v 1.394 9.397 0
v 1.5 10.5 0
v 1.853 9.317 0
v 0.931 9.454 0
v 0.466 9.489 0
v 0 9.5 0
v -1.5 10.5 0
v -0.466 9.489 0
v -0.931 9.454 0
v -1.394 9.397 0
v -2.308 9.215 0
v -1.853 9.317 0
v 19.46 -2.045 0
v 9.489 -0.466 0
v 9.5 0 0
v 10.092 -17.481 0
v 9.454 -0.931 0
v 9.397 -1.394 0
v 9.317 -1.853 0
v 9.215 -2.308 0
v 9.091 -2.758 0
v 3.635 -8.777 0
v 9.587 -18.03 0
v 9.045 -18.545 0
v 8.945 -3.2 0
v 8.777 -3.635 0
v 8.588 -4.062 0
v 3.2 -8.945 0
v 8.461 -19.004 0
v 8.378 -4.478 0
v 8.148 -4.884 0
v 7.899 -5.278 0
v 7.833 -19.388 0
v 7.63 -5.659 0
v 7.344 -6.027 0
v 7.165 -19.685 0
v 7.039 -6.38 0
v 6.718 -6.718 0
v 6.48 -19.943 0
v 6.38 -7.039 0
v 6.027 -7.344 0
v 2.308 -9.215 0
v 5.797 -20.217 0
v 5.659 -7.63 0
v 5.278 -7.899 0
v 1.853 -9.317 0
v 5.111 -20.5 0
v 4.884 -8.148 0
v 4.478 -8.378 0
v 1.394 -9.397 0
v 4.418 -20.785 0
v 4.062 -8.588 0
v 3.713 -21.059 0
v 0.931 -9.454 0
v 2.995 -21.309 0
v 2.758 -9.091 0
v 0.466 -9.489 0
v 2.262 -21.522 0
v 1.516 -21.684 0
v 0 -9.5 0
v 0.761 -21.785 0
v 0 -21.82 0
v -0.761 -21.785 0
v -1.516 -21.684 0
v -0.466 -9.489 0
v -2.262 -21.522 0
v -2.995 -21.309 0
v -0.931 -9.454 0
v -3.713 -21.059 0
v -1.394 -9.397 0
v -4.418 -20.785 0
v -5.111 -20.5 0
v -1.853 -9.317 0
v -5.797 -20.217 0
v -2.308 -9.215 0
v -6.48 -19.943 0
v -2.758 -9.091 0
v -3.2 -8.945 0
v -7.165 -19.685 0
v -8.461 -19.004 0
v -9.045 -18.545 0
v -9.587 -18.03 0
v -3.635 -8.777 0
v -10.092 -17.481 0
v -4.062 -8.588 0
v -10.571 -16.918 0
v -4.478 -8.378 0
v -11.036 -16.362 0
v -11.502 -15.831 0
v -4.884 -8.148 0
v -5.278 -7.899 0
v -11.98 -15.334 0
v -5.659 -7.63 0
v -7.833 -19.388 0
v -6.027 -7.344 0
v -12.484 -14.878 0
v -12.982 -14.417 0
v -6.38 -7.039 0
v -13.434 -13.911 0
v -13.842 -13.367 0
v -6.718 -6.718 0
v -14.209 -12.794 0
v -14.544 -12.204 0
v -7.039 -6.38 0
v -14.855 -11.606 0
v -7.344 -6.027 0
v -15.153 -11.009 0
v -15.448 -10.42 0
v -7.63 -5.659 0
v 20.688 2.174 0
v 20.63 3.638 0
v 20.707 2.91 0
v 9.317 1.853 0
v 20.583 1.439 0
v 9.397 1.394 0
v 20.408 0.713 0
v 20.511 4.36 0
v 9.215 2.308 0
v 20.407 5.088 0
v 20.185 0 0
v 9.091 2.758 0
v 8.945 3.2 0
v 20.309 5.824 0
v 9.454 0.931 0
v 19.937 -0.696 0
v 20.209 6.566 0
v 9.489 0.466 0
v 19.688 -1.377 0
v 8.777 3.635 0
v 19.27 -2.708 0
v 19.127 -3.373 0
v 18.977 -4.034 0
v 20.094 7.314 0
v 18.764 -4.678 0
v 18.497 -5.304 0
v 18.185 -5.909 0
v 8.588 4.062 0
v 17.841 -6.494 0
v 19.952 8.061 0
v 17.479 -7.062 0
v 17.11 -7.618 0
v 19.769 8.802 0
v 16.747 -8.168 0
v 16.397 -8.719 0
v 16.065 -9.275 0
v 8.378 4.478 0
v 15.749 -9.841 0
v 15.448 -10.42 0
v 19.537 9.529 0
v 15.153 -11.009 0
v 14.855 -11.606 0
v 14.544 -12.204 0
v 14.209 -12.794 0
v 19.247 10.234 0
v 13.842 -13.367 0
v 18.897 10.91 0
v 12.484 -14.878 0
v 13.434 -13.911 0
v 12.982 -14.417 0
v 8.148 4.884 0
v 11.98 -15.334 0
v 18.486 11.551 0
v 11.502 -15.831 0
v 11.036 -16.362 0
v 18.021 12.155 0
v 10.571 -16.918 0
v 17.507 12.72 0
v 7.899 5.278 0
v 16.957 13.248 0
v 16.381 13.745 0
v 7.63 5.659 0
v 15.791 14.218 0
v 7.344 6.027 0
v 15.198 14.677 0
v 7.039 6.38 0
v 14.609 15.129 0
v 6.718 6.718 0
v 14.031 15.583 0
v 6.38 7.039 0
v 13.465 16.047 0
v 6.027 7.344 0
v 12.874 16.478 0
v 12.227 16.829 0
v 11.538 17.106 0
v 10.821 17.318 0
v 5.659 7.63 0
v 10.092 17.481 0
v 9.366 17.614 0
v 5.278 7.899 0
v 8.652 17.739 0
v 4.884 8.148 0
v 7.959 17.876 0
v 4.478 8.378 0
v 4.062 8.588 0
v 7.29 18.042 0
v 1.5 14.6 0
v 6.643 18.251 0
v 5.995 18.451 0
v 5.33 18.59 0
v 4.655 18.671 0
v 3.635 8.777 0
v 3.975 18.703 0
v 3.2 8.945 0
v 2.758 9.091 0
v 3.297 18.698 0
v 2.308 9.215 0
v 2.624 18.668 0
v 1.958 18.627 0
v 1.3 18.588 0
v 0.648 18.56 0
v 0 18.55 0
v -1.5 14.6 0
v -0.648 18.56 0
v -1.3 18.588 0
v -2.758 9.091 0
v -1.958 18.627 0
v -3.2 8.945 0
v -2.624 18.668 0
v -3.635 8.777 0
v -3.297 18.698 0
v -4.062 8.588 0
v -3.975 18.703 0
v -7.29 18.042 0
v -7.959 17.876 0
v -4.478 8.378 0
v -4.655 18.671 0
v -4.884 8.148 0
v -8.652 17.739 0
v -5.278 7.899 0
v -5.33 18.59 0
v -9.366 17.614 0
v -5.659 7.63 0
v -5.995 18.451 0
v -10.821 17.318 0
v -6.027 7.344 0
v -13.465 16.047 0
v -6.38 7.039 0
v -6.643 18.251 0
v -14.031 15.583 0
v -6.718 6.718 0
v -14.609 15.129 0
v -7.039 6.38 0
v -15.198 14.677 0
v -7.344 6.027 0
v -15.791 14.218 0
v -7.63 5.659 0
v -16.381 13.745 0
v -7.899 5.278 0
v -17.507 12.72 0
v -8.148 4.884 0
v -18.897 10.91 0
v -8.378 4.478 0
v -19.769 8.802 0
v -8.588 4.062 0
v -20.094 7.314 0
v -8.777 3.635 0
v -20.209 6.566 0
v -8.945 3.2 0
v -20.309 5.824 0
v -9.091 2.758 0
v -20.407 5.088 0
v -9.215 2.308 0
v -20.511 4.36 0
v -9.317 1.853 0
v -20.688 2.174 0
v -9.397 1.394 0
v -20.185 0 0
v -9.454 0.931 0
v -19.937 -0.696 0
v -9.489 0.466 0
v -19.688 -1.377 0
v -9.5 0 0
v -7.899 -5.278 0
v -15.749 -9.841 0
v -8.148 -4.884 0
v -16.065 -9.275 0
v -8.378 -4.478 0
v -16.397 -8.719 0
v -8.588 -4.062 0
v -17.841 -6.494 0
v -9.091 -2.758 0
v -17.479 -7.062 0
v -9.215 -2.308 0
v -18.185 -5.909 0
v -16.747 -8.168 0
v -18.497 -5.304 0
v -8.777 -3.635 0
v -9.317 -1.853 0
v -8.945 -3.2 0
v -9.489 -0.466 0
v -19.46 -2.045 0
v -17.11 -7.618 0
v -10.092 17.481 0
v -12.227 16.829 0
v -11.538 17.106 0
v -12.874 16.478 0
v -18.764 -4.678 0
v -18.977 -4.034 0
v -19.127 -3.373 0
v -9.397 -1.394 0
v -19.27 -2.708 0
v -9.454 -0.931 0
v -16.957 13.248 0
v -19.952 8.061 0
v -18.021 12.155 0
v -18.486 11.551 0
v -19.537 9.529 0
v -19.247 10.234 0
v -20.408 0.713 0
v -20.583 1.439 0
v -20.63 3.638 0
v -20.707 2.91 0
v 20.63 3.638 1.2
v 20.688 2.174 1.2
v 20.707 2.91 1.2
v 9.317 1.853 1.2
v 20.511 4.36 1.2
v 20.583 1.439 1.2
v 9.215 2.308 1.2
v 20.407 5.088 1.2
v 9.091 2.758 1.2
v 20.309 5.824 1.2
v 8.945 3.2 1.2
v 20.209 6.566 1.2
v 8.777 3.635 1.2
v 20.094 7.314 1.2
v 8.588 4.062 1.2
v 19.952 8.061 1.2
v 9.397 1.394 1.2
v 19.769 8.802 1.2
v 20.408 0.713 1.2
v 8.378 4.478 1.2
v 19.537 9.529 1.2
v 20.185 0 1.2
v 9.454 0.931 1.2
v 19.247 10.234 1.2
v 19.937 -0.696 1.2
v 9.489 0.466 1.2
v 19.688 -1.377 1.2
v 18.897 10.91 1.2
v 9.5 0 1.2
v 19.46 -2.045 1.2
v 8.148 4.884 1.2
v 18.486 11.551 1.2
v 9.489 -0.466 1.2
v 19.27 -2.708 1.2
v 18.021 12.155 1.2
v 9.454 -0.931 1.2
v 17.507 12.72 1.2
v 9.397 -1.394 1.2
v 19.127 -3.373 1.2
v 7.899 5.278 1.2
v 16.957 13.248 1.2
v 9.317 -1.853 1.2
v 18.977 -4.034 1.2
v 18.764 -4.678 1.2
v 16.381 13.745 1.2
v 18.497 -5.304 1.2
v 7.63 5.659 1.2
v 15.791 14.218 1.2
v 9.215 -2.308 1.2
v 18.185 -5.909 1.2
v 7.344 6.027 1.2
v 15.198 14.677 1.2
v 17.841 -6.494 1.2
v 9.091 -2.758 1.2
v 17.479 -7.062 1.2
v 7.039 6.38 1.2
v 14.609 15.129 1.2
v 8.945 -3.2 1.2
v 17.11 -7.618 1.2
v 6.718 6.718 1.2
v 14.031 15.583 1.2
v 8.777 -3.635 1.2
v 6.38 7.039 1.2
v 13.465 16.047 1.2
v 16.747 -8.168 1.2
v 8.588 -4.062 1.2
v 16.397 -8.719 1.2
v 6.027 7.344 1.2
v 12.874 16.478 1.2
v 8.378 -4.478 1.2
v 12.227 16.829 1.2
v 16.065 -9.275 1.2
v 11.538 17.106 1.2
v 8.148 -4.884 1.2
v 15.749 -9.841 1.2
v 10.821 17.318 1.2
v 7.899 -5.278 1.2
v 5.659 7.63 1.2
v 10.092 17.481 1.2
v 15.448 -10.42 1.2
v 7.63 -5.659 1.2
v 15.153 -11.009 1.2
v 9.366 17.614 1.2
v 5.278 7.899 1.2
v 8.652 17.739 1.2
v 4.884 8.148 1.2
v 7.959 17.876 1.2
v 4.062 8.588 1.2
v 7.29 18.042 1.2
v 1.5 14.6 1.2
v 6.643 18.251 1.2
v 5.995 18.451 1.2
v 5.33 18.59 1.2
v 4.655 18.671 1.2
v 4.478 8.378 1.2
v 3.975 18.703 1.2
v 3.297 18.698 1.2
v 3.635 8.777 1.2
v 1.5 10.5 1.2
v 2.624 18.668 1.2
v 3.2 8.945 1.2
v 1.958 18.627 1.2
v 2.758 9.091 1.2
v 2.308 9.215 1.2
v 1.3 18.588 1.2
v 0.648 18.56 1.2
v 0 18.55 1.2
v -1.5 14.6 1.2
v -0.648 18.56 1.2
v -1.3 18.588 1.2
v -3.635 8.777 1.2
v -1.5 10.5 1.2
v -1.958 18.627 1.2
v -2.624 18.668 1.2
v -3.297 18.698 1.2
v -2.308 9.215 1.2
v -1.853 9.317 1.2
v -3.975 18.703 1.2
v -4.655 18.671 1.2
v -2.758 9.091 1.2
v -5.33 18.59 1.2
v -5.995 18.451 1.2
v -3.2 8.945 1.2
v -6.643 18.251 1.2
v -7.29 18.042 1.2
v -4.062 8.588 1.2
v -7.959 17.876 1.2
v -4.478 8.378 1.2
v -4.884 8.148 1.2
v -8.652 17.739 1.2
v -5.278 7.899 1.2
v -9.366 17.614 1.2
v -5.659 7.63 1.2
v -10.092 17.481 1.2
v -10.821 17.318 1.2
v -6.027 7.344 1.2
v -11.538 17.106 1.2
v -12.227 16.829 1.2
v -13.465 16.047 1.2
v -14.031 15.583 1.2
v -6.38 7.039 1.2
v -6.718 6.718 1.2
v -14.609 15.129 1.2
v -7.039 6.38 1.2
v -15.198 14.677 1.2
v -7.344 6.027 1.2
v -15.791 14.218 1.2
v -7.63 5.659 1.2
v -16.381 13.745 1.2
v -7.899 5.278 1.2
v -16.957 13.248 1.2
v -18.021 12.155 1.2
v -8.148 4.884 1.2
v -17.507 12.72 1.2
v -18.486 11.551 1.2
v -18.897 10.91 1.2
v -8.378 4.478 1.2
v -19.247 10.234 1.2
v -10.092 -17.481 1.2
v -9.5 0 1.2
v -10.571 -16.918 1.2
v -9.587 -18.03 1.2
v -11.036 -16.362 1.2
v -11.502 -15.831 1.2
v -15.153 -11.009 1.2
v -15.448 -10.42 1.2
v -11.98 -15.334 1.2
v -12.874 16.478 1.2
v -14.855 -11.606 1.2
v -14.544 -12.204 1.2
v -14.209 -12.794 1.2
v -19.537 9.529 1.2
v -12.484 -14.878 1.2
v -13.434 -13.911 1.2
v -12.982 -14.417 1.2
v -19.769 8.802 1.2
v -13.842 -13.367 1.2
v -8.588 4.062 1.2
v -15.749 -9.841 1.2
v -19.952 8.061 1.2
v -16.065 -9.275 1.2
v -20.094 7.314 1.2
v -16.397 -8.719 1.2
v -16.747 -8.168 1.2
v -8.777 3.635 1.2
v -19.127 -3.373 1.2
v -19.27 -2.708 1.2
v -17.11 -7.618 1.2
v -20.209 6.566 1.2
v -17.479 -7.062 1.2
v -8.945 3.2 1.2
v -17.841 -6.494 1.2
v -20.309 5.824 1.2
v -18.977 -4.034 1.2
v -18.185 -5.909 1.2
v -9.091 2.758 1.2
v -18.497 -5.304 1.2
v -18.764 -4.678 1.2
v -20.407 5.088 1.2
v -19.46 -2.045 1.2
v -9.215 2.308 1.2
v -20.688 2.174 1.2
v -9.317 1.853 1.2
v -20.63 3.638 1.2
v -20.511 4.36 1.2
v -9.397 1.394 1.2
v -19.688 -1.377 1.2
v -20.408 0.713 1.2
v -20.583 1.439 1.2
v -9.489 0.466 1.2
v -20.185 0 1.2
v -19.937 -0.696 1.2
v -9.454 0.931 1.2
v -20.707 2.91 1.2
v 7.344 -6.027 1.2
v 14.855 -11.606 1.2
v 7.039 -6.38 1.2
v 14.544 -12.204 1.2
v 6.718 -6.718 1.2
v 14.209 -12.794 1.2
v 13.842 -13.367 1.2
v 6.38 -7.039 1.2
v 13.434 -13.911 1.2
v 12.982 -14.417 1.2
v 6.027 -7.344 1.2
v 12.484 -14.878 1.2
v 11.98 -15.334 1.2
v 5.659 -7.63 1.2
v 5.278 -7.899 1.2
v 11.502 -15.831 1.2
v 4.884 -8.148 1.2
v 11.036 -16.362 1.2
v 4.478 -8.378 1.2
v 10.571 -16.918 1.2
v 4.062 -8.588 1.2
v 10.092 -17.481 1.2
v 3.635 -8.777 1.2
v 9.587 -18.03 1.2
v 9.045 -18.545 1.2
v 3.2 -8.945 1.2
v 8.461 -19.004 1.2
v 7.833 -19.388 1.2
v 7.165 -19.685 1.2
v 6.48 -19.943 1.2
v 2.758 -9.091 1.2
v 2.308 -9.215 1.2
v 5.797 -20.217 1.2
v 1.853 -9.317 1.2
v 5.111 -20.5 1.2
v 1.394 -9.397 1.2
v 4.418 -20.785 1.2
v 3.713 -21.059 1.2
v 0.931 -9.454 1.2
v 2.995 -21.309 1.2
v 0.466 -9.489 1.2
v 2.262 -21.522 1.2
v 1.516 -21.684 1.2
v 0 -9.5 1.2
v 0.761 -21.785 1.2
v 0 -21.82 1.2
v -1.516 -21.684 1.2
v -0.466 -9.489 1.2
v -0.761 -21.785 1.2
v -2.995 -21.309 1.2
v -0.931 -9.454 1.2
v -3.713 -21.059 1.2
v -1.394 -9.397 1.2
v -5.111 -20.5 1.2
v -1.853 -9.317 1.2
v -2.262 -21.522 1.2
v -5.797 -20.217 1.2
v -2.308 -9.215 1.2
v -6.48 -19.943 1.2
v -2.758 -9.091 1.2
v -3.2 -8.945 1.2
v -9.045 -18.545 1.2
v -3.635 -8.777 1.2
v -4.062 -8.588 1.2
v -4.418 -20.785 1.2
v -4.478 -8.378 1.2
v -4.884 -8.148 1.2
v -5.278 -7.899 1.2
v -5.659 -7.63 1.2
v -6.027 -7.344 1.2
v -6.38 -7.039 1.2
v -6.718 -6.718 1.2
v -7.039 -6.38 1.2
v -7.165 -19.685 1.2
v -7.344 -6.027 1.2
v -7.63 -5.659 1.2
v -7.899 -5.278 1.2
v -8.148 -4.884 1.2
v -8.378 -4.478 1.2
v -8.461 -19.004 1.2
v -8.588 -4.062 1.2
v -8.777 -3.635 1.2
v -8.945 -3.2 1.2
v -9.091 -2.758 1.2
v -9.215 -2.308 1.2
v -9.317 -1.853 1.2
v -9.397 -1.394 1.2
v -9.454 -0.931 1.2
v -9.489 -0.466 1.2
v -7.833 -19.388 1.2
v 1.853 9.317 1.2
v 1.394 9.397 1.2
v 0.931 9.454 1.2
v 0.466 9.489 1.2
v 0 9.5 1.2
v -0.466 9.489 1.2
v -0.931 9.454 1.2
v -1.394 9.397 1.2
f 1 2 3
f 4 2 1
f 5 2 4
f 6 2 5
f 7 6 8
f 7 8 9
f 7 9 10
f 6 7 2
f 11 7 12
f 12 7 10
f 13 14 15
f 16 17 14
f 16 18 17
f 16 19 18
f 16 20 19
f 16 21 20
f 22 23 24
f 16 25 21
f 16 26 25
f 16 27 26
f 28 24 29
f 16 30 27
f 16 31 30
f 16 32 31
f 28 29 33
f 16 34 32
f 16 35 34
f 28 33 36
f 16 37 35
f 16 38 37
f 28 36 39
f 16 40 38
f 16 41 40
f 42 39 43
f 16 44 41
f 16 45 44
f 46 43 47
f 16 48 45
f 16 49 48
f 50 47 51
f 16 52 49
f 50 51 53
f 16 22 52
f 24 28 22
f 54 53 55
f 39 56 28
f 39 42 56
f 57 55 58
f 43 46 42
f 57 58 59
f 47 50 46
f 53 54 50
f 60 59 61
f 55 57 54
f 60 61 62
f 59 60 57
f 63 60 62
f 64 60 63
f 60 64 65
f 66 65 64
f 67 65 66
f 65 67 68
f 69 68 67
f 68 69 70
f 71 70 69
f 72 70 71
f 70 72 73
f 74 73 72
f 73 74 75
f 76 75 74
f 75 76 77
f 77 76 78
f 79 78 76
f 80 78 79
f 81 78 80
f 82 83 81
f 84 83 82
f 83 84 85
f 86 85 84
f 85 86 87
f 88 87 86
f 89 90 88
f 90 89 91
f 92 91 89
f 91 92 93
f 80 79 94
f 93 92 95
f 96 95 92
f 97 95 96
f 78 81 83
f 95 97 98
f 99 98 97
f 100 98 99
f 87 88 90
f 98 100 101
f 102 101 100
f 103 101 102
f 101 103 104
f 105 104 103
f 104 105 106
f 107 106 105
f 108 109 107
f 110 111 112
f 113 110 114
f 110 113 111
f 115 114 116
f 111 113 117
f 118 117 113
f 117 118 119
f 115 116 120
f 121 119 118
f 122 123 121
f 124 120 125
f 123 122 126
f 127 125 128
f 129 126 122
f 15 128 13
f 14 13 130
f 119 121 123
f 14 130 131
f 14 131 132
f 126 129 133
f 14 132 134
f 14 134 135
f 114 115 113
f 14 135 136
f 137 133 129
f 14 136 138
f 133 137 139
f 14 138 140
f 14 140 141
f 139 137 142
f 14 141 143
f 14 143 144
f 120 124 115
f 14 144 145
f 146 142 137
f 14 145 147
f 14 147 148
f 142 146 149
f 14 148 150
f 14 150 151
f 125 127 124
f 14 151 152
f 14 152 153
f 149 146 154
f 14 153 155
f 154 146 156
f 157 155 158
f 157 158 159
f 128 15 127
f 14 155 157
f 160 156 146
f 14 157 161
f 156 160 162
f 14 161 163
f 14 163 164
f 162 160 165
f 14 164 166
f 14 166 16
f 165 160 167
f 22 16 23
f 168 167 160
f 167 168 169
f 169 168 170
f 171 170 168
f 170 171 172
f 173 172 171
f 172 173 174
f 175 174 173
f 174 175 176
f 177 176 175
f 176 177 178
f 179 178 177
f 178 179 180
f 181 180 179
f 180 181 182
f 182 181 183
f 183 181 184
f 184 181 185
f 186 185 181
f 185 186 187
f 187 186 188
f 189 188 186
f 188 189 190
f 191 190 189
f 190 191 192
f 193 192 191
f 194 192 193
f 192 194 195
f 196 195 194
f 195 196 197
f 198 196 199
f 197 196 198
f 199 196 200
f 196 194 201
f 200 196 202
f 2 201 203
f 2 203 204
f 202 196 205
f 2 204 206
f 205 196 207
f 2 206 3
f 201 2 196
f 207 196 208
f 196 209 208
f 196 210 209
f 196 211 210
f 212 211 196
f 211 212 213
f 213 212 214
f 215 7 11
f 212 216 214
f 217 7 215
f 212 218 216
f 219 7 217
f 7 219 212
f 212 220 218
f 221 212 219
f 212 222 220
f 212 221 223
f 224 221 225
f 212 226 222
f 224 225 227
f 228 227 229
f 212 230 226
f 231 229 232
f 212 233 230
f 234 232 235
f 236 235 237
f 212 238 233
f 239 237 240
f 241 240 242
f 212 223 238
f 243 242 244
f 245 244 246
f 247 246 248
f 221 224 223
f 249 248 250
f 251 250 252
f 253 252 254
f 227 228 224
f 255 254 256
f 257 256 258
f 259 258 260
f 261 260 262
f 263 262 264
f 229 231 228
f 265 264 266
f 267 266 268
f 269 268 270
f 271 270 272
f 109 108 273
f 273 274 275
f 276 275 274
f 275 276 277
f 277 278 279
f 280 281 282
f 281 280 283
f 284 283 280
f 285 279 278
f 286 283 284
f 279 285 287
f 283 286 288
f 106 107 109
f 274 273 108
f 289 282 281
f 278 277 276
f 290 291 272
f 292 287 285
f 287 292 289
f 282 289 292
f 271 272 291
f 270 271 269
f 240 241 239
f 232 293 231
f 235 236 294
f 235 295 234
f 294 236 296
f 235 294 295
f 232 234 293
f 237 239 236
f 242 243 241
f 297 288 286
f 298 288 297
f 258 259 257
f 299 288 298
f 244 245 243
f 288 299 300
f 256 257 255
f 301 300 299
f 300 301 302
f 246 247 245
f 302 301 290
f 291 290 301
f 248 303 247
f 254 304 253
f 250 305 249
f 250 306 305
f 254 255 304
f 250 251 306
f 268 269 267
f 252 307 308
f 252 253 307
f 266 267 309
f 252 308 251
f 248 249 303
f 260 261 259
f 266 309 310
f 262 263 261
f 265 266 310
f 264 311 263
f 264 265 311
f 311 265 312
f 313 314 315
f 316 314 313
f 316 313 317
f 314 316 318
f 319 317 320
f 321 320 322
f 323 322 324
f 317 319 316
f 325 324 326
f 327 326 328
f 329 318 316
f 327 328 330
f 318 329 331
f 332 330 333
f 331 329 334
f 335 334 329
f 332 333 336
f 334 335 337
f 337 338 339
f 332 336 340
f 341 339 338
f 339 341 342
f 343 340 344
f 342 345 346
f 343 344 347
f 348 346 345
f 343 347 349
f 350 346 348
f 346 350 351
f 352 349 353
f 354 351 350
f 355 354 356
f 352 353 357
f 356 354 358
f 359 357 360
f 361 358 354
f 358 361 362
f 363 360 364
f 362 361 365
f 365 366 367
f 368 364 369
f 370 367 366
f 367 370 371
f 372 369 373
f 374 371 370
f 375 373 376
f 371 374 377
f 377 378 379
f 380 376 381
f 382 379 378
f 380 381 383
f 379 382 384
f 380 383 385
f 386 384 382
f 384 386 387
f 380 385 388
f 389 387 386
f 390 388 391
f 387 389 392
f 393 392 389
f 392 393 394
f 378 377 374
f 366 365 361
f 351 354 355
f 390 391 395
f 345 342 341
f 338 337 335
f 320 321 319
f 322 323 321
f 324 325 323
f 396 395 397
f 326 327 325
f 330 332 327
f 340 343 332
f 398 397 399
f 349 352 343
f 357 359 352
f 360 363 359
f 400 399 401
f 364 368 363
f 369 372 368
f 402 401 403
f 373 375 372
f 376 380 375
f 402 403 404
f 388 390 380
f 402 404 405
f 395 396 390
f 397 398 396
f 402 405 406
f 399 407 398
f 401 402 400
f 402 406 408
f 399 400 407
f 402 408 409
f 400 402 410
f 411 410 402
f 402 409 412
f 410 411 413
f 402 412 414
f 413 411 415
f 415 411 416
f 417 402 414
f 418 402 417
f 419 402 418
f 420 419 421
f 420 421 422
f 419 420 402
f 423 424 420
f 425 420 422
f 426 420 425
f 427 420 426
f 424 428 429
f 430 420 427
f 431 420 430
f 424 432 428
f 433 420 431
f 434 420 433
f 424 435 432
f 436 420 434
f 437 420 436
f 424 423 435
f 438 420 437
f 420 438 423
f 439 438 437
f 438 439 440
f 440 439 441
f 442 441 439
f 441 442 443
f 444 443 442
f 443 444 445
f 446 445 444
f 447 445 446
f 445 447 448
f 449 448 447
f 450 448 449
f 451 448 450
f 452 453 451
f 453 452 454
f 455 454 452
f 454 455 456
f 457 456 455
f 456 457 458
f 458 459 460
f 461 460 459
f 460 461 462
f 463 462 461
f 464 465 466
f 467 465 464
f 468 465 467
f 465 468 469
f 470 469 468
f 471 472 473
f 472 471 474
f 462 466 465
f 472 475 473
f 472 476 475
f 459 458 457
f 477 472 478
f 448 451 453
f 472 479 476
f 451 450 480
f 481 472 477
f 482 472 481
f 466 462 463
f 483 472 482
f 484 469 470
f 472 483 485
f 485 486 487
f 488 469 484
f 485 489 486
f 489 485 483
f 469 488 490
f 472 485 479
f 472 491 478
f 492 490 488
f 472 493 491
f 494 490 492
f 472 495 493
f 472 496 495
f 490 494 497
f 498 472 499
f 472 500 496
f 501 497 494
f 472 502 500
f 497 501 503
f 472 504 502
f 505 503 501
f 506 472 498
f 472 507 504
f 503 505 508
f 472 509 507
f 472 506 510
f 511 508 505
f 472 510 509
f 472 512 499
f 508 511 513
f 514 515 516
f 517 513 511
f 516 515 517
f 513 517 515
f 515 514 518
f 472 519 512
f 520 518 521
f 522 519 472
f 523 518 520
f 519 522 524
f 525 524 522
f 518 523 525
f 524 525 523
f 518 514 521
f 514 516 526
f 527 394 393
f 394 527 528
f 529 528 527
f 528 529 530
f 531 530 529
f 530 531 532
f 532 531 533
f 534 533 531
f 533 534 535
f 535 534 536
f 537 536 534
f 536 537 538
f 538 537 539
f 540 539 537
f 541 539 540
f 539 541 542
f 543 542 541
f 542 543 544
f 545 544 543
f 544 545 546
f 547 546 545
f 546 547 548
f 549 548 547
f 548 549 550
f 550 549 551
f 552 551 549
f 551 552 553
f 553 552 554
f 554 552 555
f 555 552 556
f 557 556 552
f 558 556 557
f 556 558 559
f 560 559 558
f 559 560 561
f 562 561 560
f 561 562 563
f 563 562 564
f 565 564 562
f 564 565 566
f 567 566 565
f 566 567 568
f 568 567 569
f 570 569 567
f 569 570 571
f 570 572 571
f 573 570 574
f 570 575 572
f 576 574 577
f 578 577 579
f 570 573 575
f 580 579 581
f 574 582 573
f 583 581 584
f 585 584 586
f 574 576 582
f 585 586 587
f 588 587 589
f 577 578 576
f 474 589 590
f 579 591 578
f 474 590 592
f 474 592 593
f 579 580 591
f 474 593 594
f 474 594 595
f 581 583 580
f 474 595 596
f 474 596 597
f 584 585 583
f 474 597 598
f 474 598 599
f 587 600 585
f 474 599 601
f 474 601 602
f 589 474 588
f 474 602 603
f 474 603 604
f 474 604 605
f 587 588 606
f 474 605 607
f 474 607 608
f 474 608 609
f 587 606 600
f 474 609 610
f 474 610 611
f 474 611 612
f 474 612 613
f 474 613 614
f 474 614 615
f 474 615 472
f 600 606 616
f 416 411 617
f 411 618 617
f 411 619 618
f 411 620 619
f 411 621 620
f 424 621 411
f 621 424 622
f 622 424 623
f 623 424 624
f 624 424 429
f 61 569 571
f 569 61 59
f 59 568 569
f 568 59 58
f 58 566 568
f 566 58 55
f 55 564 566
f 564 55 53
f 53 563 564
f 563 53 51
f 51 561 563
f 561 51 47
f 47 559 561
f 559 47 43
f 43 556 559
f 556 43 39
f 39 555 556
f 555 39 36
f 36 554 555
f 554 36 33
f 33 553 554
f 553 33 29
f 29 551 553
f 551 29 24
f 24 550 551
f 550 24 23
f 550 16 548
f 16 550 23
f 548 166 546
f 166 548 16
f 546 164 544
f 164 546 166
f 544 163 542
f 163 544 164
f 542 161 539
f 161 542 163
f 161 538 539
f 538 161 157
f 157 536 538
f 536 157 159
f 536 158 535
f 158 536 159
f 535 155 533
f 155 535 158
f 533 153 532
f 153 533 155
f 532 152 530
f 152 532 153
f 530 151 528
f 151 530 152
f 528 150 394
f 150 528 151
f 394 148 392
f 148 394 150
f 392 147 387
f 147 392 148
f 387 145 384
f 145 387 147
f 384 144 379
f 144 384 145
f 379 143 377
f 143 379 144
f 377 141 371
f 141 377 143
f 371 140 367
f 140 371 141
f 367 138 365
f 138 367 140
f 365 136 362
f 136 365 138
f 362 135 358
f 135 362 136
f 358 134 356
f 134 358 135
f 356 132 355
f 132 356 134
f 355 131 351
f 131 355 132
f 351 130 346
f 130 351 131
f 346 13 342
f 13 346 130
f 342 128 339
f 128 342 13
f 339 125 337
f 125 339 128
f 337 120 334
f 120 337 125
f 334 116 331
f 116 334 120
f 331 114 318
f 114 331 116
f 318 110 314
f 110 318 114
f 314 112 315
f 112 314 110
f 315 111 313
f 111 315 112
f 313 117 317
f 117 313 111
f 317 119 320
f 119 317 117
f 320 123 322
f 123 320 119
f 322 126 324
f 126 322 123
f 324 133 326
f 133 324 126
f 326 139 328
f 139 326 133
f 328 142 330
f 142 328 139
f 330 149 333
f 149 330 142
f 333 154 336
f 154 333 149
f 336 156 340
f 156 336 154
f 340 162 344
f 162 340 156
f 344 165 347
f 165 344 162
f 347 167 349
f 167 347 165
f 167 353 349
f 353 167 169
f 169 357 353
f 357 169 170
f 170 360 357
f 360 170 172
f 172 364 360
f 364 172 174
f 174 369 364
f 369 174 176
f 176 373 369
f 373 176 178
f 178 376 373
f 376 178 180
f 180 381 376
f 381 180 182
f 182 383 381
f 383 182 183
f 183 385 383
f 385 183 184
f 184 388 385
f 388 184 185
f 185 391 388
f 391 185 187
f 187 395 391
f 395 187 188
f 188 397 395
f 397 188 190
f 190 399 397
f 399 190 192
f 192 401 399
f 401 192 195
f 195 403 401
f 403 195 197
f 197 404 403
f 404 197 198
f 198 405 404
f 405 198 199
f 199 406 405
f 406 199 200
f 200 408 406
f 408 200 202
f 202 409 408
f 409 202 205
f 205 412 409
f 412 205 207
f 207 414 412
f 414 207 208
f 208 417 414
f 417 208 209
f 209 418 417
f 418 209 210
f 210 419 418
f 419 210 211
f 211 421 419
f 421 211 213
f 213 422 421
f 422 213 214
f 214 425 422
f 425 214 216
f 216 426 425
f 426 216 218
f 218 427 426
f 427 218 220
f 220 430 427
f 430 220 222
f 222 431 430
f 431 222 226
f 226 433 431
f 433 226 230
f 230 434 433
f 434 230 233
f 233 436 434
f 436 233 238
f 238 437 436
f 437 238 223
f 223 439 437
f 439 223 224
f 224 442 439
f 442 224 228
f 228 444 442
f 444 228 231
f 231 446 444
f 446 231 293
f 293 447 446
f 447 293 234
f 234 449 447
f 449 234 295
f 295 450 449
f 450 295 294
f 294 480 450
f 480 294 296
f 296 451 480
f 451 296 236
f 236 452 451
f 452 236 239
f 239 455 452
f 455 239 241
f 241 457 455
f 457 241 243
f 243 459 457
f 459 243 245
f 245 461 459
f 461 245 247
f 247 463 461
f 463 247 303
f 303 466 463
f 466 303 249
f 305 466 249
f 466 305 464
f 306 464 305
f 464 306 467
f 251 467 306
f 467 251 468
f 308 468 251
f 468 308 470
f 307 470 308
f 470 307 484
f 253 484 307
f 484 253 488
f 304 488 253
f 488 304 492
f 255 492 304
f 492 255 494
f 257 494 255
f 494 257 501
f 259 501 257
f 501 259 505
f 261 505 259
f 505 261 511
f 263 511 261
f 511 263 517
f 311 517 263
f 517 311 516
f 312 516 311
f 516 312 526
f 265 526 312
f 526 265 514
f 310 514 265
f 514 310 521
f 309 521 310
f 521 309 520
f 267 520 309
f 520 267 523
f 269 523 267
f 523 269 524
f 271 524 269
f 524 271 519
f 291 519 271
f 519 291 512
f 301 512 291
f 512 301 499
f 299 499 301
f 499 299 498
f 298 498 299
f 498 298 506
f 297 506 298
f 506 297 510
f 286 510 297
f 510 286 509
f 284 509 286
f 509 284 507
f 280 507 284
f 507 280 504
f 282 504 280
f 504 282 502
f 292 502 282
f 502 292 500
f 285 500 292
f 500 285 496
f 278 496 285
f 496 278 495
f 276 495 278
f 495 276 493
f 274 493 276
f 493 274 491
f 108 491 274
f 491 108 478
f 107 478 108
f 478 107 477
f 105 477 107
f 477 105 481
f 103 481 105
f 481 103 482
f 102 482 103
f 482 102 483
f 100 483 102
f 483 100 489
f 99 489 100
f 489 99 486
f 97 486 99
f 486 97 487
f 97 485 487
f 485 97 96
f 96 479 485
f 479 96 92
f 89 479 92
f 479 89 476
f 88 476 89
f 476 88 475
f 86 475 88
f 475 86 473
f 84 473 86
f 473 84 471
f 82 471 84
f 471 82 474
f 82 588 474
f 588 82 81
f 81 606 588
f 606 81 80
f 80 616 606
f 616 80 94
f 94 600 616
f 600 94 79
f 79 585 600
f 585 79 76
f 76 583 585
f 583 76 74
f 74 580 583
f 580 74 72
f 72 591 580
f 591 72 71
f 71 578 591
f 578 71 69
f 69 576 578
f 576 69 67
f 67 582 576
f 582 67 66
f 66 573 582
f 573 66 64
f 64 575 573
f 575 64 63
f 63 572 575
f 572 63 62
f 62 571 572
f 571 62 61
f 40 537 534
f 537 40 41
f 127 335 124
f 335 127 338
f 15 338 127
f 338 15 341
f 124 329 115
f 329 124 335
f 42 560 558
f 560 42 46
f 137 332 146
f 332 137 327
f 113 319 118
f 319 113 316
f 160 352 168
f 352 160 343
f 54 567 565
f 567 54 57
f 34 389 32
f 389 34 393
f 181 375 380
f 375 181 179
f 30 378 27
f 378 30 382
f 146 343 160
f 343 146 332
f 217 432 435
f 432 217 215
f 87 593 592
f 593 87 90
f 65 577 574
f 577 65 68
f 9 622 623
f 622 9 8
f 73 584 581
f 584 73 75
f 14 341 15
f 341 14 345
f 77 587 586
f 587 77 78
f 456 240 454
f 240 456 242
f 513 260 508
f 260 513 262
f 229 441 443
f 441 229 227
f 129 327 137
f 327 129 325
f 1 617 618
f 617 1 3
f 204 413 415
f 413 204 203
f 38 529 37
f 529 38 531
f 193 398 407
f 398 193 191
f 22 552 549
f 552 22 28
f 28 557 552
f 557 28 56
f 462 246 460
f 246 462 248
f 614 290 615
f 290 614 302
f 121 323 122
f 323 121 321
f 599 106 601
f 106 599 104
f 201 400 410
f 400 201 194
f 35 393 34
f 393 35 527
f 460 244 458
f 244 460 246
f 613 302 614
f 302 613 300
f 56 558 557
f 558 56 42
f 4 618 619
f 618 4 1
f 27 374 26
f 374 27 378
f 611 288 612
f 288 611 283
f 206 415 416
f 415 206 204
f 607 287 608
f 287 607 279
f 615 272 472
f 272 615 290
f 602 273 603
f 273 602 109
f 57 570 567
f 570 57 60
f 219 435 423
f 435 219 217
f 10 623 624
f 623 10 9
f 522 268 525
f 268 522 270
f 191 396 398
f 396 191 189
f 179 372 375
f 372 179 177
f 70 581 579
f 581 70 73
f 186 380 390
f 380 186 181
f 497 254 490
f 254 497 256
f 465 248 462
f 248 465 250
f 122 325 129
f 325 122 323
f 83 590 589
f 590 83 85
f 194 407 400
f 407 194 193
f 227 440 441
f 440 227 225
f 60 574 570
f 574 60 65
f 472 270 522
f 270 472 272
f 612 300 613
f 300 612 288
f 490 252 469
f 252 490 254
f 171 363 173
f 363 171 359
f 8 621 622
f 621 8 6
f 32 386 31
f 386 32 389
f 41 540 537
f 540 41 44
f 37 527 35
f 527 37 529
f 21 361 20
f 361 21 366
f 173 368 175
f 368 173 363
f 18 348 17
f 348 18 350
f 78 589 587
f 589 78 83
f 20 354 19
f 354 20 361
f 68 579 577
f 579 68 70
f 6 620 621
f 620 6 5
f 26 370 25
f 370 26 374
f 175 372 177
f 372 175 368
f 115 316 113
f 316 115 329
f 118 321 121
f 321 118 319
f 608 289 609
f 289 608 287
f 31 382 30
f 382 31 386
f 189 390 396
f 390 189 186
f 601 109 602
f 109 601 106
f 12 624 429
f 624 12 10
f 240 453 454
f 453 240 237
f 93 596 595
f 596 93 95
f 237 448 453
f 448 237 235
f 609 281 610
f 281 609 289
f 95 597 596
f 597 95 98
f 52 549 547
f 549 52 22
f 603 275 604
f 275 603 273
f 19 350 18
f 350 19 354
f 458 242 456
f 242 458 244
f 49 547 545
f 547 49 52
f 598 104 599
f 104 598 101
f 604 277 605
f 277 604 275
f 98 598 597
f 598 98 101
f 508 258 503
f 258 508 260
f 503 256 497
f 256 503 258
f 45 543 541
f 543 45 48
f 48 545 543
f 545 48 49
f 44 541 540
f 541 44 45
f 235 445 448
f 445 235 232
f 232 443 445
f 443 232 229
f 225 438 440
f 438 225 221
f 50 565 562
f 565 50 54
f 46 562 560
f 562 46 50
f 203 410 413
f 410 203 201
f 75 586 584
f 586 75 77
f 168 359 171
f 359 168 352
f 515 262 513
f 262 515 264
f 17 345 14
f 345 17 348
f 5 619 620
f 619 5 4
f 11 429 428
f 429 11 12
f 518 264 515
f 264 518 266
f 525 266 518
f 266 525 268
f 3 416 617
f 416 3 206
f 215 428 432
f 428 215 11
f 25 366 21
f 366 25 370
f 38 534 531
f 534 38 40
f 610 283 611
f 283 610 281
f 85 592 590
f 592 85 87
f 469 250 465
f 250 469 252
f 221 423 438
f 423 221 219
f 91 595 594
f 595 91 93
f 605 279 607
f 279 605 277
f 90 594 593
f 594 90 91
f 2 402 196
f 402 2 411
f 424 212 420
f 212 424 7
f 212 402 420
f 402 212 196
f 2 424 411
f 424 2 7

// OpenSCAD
/*
  Elna Supermatic cam 05
  Name: Scallop
  Status: candidate

  Generated from measured parametric base v2.
  Surface mode: smooth
*/

include <_elna_measured_common.scad>;

profile_points = [
        [0.0000, 18.5500],
        [0.6481, 18.5600],
        [1.2998, 18.5879],
        [1.9578, 18.6271],
        [2.6236, 18.6678],
        [3.2969, 18.6976],
        [3.9754, 18.7029],
        [4.6551, 18.6707],
        [5.3305, 18.5896],
        [5.9951, 18.4511],
        [6.6427, 18.2507],
        [7.2896, 18.0424],
        [7.9589, 17.8760],
        [8.6519, 17.7391],
        [9.3656, 17.6141],
        [10.0925, 17.4807],
        [10.8214, 17.3178],
        [11.5381, 17.1059],
        [12.2273, 16.8294],
        [12.8739, 16.4778],
        [13.4651, 16.0471],
        [14.0312, 15.5833],
        [14.6095, 15.1286],
        [15.1980, 14.6766],
        [15.7913, 14.2185],
        [16.3811, 13.7454],
        [16.9570, 13.2483],
        [17.5073, 12.7198],
        [18.0206, 12.1550],
        [18.4863, 11.5515],
        [18.8967, 10.9100],
        [19.2471, 10.2339],
        [19.5368, 9.5288],
        [19.7694, 8.8019],
        [19.9518, 8.0611],
        [20.0944, 7.3138],
        [20.2093, 6.5664],
        [20.3093, 5.8236],
        [20.4066, 5.0879],
        [20.5111, 4.3598],
        [20.6298, 3.6376],
        [20.7072, 2.9102],
        [20.6883, 2.1744],
        [20.5832, 1.4393],
        [20.4083, 0.7127],
        [20.1850, 0.0000],
        [19.9371, -0.6962],
        [19.6884, -1.3768],
        [19.4605, -2.0454],
        [19.2700, -2.7082],
        [19.1269, -3.3726],
        [18.9767, -4.0336],
        [18.7643, -4.6785],
        [18.4969, -5.3039],
        [18.1849, -5.9086],
        [17.8410, -6.4936],
        [17.4786, -7.0618],
        [17.1105, -7.6181],
        [16.7475, -8.1683],
        [16.3975, -8.7187],
        [16.0648, -9.2750],
        [15.7494, -9.8413],
        [15.4477, -10.4196],
        [15.1527, -11.0091],
        [14.8550, -11.6060],
        [14.5441, -12.2040],
        [14.2095, -12.7943],
        [13.8417, -13.3668],
        [13.4338, -13.9111],
        [12.9816, -14.4175],
        [12.4842, -14.8781],
        [11.9804, -15.3342],
        [11.5016, -15.8306],
        [11.0365, -16.3623],
        [10.5715, -16.9179],
        [10.0925, -17.4807],
        [9.5870, -18.0305],
        [9.0451, -18.5452],
        [8.4610, -19.0038],
        [7.8333, -19.3880],
        [7.1646, -19.6847],
        [6.4799, -19.9430],
        [5.7970, -20.2166],
        [5.1113, -20.5001],
        [4.4180, -20.7849],
        [3.7133, -21.0591],
        [2.9948, -21.3093],
        [2.2620, -21.5217],
        [1.5163, -21.6838],
        [0.7608, -21.7854],
        [0.0000, -21.8200],
        [-0.7608, -21.7854],
        [-1.5163, -21.6838],
        [-2.2620, -21.5217],
        [-2.9948, -21.3093],
        [-3.7133, -21.0591],
        [-4.4180, -20.7849],
        [-5.1113, -20.5001],
        [-5.7970, -20.2166],
        [-6.4799, -19.9430],
        [-7.1646, -19.6847],
        [-7.8333, -19.3880],
        [-8.4610, -19.0038],
        [-9.0451, -18.5452],
        [-9.5870, -18.0305],
        [-10.0925, -17.4807],
        [-10.5715, -16.9179],
        [-11.0365, -16.3623],
        [-11.5016, -15.8306],
        [-11.9804, -15.3342],
        [-12.4842, -14.8781],
        [-12.9816, -14.4175],
        [-13.4338, -13.9111],
        [-13.8417, -13.3668],
        [-14.2095, -12.7943],
        [-14.5441, -12.2040],
        [-14.8550, -11.6060],
        [-15.1527, -11.0091],
        [-15.4477, -10.4196],
        [-15.7494, -9.8413],
        [-16.0648, -9.2750],
        [-16.3975, -8.7187],
        [-16.7475, -8.1683],
        [-17.1105, -7.6181],
        [-17.4786, -7.0618],
        [-17.8410, -6.4936],
        [-18.1849, -5.9086],
        [-18.4969, -5.3039],
        [-18.7643, -4.6785],
        [-18.9767, -4.0336],
        [-19.1269, -3.3726],
        [-19.2700, -2.7082],
        [-19.4605, -2.0454],
        [-19.6884, -1.3768],
        [-19.9371, -0.6962],
        [-20.1850, -0.0000],
        [-20.4083, 0.7127],
        [-20.5832, 1.4393],
        [-20.6883, 2.1744],
        [-20.7072, 2.9102],
        [-20.6298, 3.6376],
        [-20.5111, 4.3598],
        [-20.4066, 5.0879],
        [-20.3093, 5.8236],
        [-20.2093, 6.5664],
        [-20.0944, 7.3138],
        [-19.9518, 8.0611],
        [-19.7694, 8.8019],
        [-19.5368, 9.5288],
        [-19.2471, 10.2339],
        [-18.8967, 10.9100],
        [-18.4863, 11.5515],
        [-18.0206, 12.1550],
        [-17.5073, 12.7198],
        [-16.9570, 13.2483],
        [-16.3811, 13.7454],
        [-15.7913, 14.2185],
        [-15.1980, 14.6766],
        [-14.6095, 15.1286],
        [-14.0312, 15.5833],
        [-13.4651, 16.0471],
        [-12.8739, 16.4778],
        [-12.2273, 16.8294],
        [-11.5381, 17.1059],
        [-10.8214, 17.3178],
        [-10.0925, 17.4807],
        [-9.3656, 17.6141],
        [-8.6519, 17.7391],
        [-7.9589, 17.8760],
        [-7.2896, 18.0424],
        [-6.6427, 18.2507],
        [-5.9951, 18.4511],
        [-5.3305, 18.5896],
        [-4.6551, 18.6707],
        [-3.9754, 18.7029],
        [-3.2969, 18.6976],
        [-2.6236, 18.6678],
        [-1.9578, 18.6271],
        [-1.2998, 18.5879],
        [-0.6481, 18.5600]
];

icon_points = [[-1.000,0.100], [-0.959,0.257], [-0.918,0.408], [-0.878,0.547], [-0.837,0.670], [-0.796,0.773], [-0.755,0.850], [-0.714,0.899], [-0.673,0.920], [-0.633,0.909], [-0.592,0.870], [-0.551,0.801], [-0.510,0.707], [-0.469,0.590], [-0.429,0.456], [-0.388,0.308], [-0.347,0.153], [-0.306,0.205], [-0.265,0.358], [-0.224,0.502], [-0.184,0.632], [-0.143,0.741], [-0.102,0.827], [-0.061,0.886], [-0.020,0.916], [0.020,0.916], [0.061,0.886], [0.102,0.827], [0.143,0.741], [0.184,0.632], [0.224,0.502], [0.265,0.358], [0.306,0.205], [0.347,0.153], [0.388,0.308], [0.429,0.456], [0.469,0.590], [0.510,0.707], [0.551,0.801], [0.592,0.870], [0.633,0.909], [0.673,0.920], [0.714,0.899], [0.755,0.850], [0.796,0.773], [0.837,0.670], [0.878,0.547], [0.918,0.408], [0.959,0.257], [1.000,0.100]];

elna_cam_ring(profile_points=profile_points);
